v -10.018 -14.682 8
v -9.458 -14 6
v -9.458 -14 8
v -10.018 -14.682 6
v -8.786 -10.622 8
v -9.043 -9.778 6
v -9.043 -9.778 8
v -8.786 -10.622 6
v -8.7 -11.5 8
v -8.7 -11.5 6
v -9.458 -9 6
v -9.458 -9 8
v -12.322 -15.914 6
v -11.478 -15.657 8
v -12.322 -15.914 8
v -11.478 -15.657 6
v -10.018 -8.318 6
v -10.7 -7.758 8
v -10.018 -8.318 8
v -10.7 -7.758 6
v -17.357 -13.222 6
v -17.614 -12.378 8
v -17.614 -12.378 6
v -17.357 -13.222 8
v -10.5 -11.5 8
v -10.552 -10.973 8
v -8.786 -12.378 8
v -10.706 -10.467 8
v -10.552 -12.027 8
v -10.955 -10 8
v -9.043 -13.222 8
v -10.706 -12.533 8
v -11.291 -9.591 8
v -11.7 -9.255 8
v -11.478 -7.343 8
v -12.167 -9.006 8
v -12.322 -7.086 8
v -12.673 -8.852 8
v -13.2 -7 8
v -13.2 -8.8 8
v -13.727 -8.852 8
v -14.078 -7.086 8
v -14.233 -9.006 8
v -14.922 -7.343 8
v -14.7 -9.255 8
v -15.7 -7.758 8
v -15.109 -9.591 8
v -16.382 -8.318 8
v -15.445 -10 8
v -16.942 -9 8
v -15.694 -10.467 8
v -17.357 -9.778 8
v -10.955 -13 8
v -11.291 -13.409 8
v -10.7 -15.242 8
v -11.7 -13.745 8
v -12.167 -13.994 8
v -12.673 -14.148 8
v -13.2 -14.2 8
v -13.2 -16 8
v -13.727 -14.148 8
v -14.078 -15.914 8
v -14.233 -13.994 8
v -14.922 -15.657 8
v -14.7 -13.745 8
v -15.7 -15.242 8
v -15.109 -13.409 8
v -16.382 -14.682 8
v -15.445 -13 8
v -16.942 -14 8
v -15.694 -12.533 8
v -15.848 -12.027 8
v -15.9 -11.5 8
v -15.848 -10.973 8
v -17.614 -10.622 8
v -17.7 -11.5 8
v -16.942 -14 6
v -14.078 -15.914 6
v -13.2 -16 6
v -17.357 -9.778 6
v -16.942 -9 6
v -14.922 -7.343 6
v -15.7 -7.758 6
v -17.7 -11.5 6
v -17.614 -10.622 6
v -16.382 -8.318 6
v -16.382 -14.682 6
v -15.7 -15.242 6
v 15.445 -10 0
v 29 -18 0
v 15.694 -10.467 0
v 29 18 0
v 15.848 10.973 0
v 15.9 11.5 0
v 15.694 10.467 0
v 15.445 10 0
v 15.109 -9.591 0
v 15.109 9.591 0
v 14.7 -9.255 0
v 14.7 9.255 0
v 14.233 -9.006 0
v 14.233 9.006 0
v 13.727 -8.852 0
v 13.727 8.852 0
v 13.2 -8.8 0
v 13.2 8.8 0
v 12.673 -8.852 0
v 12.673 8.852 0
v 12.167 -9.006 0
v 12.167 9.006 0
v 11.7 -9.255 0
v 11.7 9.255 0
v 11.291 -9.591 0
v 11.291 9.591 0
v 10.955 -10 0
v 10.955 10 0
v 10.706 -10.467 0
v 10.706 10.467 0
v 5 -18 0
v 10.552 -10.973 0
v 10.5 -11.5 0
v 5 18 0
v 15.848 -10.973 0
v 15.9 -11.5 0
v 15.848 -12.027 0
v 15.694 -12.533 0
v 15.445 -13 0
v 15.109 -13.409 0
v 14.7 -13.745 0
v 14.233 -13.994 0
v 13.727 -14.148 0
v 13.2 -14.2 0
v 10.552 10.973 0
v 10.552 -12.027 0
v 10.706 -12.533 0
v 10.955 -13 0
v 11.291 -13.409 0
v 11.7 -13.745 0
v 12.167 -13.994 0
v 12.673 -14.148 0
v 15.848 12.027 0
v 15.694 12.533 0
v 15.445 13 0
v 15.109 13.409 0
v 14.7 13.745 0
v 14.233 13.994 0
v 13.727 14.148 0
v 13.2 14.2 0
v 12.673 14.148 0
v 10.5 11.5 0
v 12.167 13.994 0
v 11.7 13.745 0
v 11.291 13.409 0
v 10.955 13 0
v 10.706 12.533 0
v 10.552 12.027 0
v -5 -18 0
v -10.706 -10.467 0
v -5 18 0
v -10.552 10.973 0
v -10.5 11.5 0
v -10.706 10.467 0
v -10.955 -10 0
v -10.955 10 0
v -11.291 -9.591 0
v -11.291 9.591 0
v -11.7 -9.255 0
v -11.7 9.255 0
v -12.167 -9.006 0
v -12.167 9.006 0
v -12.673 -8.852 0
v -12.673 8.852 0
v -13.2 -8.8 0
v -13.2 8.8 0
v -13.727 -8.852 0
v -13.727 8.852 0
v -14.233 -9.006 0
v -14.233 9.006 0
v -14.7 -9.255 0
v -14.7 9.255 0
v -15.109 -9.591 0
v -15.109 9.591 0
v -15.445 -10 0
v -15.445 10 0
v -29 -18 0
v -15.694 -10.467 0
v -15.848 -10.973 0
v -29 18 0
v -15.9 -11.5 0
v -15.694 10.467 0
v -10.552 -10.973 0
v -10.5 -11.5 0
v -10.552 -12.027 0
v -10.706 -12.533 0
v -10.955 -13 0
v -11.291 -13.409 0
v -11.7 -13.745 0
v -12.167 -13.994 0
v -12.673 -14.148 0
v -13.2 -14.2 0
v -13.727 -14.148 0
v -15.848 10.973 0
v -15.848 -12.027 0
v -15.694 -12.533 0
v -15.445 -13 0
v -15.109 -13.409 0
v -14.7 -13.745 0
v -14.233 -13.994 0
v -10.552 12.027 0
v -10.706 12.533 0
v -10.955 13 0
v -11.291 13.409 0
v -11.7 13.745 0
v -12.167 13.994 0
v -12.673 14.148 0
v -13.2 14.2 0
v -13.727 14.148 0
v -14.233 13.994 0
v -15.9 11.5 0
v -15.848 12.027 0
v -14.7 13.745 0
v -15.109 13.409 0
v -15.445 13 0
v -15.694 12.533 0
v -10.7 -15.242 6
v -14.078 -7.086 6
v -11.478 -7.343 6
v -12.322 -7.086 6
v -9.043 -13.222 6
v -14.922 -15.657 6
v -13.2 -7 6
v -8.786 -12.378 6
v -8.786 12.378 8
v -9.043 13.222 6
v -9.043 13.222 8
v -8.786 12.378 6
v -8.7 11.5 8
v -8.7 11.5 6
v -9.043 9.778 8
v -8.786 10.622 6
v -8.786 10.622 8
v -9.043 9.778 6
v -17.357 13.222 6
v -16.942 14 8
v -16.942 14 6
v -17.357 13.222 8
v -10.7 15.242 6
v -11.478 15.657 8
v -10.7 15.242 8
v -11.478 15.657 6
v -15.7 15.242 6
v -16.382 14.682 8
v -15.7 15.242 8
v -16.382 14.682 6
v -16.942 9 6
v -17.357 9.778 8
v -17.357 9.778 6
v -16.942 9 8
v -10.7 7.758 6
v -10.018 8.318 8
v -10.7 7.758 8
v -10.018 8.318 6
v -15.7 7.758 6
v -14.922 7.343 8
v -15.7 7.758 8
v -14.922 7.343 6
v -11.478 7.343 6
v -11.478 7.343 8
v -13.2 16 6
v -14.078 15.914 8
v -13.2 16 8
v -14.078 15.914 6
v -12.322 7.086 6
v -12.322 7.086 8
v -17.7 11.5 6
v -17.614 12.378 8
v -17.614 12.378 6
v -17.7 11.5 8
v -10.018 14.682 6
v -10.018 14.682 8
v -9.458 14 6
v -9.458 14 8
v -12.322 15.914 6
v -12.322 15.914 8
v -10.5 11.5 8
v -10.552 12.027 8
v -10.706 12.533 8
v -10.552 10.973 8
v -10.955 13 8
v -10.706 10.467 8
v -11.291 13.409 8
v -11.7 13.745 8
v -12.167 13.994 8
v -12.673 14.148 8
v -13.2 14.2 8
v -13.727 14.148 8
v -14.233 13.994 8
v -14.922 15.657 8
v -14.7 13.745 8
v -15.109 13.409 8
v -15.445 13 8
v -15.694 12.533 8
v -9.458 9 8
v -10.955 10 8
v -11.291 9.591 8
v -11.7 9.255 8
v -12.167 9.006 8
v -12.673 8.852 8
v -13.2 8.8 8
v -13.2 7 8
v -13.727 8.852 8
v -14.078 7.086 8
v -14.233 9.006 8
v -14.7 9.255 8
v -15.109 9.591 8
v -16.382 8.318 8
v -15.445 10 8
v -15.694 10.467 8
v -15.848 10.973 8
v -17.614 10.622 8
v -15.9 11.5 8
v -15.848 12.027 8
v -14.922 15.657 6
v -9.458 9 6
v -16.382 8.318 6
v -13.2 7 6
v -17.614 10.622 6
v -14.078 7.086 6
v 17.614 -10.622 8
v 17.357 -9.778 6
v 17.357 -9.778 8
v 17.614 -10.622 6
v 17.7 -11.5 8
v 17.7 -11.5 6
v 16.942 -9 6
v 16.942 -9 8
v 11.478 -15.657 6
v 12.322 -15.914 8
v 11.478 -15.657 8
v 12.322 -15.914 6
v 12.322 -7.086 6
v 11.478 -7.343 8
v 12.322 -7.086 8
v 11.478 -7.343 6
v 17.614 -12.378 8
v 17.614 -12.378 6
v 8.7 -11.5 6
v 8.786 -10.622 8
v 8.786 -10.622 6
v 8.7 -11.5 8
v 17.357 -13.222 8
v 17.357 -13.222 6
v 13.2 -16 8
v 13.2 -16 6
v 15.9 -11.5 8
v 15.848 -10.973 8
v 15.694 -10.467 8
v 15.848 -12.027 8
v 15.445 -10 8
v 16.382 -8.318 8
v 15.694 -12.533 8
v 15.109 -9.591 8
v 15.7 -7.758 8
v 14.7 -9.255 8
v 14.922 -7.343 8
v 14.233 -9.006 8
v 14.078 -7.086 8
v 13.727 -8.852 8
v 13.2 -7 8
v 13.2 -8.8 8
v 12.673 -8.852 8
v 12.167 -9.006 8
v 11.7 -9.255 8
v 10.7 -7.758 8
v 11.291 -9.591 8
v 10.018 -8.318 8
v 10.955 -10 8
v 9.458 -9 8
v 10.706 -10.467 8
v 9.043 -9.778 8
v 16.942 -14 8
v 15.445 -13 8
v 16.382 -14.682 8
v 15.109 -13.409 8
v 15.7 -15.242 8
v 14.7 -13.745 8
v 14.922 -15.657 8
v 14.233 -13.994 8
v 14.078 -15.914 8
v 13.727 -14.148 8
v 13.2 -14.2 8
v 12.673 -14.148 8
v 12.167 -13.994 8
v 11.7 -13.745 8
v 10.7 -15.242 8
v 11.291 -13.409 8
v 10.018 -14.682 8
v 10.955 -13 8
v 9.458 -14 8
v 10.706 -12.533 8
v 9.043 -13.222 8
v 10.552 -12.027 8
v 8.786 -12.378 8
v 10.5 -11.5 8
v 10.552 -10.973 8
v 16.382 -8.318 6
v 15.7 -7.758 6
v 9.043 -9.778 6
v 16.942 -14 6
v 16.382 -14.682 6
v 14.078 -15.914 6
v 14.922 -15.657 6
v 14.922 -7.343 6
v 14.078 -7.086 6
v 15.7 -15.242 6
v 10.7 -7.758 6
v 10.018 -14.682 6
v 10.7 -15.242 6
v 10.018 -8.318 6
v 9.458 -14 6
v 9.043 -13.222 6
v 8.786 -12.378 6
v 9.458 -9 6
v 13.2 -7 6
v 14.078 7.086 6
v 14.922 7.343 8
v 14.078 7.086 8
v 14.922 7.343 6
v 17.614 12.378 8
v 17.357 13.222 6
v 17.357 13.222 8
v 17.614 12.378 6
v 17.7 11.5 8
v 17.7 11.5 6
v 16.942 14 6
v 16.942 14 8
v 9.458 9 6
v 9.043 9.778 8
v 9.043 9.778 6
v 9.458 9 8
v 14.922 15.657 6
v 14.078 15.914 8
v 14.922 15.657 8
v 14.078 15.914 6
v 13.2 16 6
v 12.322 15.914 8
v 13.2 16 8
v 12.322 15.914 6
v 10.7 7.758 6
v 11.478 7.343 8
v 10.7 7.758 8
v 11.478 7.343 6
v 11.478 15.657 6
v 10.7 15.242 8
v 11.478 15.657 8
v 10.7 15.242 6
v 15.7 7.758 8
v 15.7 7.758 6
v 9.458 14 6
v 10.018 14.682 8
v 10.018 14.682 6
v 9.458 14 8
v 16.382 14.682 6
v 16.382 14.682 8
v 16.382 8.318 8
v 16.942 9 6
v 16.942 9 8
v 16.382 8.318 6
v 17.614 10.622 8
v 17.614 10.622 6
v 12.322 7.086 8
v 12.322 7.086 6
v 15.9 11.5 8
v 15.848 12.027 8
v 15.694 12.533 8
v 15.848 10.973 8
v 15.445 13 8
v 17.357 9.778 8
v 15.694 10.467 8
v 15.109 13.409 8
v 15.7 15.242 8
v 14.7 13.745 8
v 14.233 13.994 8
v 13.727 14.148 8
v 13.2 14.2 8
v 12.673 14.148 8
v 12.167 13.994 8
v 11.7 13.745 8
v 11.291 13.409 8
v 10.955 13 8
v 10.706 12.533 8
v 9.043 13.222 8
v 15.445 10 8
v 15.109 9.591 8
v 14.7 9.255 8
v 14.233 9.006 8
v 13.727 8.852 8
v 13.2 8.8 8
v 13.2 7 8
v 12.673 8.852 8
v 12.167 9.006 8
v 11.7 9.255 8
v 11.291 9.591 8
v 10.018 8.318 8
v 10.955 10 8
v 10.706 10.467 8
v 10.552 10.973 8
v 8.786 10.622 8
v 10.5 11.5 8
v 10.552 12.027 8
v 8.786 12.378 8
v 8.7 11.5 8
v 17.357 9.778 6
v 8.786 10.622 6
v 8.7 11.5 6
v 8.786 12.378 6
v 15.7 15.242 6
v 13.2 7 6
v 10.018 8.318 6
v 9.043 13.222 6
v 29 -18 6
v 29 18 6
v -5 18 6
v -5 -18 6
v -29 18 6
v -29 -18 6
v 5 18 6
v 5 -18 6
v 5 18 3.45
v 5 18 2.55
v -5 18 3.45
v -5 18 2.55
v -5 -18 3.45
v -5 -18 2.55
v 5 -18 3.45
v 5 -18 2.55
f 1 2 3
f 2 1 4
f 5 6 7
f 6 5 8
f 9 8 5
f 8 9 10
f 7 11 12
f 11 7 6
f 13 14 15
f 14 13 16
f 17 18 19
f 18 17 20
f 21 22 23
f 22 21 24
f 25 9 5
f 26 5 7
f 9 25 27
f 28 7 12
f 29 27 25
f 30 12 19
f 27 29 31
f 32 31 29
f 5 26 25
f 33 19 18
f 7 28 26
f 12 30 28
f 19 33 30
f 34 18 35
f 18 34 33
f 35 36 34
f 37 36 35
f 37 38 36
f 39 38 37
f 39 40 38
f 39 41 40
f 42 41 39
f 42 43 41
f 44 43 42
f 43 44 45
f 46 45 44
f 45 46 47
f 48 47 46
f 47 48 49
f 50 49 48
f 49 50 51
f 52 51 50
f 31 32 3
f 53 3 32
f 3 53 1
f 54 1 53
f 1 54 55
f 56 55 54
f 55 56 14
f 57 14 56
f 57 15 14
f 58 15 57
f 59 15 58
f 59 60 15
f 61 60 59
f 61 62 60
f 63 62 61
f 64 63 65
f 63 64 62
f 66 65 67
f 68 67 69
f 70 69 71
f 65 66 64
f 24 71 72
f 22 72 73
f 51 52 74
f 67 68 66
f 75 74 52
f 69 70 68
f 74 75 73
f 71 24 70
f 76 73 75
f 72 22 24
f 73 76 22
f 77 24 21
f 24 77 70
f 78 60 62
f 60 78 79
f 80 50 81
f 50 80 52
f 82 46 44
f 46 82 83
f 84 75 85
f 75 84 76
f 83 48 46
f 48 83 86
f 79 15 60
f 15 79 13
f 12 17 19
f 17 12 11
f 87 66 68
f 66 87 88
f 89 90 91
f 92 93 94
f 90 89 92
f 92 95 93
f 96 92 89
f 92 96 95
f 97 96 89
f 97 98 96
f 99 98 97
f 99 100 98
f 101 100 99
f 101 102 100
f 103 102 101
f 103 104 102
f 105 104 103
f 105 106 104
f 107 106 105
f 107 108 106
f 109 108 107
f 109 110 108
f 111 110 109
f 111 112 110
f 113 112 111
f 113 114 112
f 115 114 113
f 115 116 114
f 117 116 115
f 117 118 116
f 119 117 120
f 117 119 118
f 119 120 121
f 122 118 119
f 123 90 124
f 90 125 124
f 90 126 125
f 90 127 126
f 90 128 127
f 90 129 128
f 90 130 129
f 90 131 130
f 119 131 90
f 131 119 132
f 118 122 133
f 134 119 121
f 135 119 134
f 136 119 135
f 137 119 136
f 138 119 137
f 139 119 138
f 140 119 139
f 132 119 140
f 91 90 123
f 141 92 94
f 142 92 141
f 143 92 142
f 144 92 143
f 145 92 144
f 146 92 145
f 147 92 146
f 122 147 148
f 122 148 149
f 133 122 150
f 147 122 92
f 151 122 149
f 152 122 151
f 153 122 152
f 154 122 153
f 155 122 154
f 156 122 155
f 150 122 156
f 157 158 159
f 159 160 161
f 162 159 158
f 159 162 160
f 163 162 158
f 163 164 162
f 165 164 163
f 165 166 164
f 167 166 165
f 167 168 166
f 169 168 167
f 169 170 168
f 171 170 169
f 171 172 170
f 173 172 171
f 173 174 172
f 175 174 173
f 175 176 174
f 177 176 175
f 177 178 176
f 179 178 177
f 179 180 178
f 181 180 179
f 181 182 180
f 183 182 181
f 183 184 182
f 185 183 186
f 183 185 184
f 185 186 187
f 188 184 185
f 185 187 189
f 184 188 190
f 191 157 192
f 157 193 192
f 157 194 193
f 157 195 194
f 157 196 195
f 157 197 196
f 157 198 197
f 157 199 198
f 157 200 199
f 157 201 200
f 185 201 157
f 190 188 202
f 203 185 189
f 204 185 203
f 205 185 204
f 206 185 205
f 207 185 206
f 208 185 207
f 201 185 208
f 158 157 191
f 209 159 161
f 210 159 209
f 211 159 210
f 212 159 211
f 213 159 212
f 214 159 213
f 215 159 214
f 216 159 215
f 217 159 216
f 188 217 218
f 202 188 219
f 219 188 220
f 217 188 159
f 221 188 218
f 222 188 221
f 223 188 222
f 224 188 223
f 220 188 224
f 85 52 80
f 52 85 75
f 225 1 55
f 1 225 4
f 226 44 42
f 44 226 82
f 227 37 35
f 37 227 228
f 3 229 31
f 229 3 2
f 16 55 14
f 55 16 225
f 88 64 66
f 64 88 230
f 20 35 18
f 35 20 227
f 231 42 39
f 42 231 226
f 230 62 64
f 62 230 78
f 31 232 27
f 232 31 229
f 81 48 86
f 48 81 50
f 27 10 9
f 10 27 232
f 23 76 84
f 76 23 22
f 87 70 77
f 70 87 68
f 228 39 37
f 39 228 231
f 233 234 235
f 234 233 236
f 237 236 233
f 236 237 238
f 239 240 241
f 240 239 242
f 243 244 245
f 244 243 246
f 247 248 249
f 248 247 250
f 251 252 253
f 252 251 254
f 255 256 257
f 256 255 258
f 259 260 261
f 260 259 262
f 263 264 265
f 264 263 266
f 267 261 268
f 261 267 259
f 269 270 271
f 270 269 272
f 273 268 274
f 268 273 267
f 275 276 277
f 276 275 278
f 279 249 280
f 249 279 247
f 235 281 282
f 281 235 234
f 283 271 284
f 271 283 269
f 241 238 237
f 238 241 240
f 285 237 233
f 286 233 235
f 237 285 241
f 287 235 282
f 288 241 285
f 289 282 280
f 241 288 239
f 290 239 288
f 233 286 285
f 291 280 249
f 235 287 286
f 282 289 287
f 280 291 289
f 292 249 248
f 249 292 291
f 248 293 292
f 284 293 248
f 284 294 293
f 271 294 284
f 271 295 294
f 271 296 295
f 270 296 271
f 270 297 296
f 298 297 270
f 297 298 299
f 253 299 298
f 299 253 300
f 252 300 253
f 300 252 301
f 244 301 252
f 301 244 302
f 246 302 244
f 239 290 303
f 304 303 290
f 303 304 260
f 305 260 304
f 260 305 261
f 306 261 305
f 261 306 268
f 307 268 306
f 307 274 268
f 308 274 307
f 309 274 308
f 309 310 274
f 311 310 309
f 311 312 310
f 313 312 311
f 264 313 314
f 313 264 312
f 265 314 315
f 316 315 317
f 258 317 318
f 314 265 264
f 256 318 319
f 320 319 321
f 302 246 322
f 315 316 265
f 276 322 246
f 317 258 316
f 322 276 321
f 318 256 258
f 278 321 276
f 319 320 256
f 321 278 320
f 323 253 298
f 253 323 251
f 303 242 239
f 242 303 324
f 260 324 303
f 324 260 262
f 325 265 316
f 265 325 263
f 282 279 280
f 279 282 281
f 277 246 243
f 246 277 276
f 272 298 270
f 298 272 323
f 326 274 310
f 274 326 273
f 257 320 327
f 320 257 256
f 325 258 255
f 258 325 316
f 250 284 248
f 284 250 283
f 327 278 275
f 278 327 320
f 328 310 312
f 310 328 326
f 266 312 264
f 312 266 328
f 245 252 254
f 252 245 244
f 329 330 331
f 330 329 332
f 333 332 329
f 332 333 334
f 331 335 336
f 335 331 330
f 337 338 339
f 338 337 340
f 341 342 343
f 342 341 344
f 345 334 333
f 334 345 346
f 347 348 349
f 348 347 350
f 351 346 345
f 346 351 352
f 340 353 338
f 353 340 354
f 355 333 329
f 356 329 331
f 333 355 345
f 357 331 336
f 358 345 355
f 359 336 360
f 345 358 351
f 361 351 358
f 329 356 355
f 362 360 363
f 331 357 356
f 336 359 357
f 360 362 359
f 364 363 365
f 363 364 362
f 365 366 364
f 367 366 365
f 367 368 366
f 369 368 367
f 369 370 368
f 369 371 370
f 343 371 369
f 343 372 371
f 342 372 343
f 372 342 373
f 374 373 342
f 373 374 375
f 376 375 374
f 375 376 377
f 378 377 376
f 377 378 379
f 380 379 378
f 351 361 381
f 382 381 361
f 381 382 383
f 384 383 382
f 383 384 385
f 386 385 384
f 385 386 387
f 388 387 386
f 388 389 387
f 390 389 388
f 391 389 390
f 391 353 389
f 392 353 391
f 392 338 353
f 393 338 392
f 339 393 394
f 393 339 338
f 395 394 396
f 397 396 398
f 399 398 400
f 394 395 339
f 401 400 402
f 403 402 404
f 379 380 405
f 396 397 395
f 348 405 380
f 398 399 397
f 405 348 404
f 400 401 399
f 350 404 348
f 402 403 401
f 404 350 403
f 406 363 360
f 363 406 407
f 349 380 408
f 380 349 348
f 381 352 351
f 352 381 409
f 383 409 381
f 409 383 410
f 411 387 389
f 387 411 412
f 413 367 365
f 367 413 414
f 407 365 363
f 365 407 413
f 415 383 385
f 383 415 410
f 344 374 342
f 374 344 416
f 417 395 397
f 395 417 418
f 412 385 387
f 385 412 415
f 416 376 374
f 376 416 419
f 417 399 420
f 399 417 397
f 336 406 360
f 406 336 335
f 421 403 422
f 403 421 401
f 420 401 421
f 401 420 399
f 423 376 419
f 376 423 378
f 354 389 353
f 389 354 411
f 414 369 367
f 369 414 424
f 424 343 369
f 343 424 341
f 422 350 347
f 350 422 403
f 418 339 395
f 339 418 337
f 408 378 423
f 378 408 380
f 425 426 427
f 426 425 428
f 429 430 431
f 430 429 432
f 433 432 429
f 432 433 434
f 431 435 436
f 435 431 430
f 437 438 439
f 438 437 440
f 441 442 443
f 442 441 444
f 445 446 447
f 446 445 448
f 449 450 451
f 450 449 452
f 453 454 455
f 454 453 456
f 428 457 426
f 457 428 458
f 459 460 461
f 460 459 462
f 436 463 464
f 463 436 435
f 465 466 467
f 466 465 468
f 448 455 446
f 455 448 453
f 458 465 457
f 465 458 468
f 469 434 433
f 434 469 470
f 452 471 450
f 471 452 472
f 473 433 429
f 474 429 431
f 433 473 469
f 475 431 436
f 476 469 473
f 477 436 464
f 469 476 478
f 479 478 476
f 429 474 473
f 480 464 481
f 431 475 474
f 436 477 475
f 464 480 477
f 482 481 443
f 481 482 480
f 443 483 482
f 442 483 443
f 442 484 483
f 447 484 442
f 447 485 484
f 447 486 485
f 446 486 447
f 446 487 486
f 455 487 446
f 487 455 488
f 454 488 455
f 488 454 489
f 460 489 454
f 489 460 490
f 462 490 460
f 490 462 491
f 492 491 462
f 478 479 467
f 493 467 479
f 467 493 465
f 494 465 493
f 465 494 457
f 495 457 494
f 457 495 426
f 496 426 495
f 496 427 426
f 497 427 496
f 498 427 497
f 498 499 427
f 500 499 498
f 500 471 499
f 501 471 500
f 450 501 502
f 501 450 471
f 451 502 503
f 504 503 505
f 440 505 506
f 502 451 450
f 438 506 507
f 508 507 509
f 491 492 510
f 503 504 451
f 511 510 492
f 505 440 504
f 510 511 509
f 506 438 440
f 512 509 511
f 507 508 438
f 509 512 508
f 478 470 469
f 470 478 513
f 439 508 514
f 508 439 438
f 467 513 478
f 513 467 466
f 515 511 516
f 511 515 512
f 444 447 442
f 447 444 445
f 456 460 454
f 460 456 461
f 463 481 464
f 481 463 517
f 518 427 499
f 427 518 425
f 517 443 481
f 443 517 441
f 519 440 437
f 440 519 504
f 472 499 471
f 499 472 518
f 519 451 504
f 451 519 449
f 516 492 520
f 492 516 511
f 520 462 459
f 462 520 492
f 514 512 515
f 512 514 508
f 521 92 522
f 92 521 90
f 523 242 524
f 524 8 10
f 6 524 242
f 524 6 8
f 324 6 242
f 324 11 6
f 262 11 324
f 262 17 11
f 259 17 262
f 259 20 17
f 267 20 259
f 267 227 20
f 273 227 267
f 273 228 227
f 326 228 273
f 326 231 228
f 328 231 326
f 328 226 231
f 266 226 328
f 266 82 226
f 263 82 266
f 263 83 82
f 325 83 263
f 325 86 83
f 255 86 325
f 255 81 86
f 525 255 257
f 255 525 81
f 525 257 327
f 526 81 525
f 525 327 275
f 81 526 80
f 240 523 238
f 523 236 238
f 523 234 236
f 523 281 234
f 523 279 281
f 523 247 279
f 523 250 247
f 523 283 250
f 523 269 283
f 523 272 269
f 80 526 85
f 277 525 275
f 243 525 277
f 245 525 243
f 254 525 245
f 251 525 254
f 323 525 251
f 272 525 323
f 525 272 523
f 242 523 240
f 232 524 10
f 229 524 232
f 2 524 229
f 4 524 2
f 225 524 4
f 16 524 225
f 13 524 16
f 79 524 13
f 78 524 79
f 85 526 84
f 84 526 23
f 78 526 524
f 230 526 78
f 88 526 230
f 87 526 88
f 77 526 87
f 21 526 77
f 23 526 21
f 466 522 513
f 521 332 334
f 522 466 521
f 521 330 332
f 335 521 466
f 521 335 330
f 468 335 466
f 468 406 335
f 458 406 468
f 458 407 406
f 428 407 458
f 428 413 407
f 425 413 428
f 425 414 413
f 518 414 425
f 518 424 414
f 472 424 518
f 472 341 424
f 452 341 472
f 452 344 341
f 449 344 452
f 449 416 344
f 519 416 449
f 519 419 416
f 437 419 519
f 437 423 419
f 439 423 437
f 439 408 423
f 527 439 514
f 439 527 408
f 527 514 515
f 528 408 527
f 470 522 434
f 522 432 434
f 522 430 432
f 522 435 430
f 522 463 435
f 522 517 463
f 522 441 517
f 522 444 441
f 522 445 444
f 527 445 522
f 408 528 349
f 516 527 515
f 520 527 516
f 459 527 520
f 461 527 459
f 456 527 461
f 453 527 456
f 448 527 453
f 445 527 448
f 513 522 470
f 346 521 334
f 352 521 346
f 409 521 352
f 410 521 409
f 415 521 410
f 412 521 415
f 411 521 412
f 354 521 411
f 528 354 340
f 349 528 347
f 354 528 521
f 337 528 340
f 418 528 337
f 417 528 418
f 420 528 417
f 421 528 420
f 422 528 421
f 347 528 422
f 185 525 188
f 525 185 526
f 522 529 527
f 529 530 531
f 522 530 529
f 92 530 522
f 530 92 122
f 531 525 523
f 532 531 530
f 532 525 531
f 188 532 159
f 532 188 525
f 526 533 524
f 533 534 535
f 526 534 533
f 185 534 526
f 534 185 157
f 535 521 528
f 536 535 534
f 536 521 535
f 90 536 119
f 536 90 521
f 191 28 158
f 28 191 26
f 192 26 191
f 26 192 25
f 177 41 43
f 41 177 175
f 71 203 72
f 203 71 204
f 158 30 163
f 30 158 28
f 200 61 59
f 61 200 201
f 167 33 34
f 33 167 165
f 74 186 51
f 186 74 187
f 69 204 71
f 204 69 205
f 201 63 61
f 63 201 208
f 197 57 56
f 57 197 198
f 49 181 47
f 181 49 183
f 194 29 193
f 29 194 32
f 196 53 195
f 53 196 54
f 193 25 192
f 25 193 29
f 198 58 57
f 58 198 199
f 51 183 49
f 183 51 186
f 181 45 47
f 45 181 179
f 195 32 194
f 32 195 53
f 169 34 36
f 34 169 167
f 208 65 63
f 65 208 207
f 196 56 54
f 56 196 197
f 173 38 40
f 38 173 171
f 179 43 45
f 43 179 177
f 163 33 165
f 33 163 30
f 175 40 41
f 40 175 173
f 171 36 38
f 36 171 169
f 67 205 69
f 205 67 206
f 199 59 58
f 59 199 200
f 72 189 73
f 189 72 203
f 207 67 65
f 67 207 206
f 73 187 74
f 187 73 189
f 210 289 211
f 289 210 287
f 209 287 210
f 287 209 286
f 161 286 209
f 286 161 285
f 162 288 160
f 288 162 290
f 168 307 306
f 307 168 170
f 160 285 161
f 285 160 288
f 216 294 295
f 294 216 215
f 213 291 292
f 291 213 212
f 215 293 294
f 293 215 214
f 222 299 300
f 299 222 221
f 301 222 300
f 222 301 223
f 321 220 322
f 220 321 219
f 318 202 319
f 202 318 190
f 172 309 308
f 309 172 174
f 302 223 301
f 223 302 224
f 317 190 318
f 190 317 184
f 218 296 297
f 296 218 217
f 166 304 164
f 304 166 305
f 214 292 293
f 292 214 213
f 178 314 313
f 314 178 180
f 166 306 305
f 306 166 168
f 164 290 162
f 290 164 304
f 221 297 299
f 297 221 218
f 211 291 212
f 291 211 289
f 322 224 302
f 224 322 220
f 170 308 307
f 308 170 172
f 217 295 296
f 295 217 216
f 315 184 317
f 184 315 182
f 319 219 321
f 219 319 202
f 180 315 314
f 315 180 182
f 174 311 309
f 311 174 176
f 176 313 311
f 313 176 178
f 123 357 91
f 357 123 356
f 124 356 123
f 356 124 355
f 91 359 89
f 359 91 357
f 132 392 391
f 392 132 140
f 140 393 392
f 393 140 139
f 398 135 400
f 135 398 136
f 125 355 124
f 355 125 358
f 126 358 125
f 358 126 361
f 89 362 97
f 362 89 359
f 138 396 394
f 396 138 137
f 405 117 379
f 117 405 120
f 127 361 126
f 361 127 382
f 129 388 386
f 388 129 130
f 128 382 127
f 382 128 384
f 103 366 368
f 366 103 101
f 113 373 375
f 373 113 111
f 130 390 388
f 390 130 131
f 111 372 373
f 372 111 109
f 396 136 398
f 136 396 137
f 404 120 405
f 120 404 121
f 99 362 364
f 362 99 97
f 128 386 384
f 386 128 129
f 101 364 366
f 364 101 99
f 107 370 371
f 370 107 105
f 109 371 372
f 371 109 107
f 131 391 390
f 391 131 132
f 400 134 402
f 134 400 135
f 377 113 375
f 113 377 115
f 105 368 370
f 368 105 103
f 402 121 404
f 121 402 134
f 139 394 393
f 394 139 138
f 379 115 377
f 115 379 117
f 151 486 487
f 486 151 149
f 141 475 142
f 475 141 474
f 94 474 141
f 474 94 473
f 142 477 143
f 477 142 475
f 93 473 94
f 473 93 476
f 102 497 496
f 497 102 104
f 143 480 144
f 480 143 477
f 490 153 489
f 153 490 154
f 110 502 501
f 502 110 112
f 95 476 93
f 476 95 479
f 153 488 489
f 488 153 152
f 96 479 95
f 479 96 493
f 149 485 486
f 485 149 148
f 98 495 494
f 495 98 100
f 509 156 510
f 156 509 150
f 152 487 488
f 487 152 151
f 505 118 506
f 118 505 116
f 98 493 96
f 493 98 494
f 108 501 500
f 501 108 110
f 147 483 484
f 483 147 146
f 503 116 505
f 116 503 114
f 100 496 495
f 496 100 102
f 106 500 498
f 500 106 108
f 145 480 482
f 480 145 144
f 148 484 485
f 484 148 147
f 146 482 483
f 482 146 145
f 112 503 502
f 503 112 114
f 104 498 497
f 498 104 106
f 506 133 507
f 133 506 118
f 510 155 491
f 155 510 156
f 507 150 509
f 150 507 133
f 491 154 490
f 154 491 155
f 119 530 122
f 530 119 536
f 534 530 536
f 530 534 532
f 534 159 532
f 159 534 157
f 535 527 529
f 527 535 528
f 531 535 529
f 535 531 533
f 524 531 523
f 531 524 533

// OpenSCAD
$fn = 32;

// ----------------------------------------------------------------------
// Living hinge: 58 x 36 mm plates, 0.9 mm flexible web
// ----------------------------------------------------------------------

// --- parameters (mm) ---
plate_len = 24;           // plate length outside the web
plate_w = 36;             // plate width
thick = 6;                // plate thickness
web_half = 5;             // half width of the flex band
web_t = 0.9;              // flexible web thickness
web_z = 2.55;             // web position inside the thickness
boss_d = 9;               // screw boss diameter
boss_h = 8;               // screw boss height
boss_x = 13.2;            // screw boss distance from the web
screw_d = 5.4;            // screw hole

difference() {
  union() {
    /* one flat strip, later thinned at the middle */
    translate([-29, -18, 0]) cube([58, 36, 6]);
    /* screw bosses, sunk 0.5 mm into the plates */
    for (sx = [-13.2, 13.2]) {
      for (sy = [-11.5, 11.5]) {
        translate([sx, sy, 0]) cylinder(h = boss_h, d = boss_d);
      }
    }
  }
  /* channel from below: leaves the web on top of it */
  translate([-5, -20.5, -2.5]) cube([10, 41, 5.05]);
  /* channel from above: thins the web down to web_t */
  translate([-5, -20.5, 3.45]) cube([10, 41, 5.05]);
  /* screw holes through the bosses */
  for (sx = [-13.2, 13.2]) {
    for (sy = [-11.5, 11.5]) {
      translate([sx, sy, -2.5]) cylinder(h = boss_h + 5, d = screw_d);
    }
  }
}
